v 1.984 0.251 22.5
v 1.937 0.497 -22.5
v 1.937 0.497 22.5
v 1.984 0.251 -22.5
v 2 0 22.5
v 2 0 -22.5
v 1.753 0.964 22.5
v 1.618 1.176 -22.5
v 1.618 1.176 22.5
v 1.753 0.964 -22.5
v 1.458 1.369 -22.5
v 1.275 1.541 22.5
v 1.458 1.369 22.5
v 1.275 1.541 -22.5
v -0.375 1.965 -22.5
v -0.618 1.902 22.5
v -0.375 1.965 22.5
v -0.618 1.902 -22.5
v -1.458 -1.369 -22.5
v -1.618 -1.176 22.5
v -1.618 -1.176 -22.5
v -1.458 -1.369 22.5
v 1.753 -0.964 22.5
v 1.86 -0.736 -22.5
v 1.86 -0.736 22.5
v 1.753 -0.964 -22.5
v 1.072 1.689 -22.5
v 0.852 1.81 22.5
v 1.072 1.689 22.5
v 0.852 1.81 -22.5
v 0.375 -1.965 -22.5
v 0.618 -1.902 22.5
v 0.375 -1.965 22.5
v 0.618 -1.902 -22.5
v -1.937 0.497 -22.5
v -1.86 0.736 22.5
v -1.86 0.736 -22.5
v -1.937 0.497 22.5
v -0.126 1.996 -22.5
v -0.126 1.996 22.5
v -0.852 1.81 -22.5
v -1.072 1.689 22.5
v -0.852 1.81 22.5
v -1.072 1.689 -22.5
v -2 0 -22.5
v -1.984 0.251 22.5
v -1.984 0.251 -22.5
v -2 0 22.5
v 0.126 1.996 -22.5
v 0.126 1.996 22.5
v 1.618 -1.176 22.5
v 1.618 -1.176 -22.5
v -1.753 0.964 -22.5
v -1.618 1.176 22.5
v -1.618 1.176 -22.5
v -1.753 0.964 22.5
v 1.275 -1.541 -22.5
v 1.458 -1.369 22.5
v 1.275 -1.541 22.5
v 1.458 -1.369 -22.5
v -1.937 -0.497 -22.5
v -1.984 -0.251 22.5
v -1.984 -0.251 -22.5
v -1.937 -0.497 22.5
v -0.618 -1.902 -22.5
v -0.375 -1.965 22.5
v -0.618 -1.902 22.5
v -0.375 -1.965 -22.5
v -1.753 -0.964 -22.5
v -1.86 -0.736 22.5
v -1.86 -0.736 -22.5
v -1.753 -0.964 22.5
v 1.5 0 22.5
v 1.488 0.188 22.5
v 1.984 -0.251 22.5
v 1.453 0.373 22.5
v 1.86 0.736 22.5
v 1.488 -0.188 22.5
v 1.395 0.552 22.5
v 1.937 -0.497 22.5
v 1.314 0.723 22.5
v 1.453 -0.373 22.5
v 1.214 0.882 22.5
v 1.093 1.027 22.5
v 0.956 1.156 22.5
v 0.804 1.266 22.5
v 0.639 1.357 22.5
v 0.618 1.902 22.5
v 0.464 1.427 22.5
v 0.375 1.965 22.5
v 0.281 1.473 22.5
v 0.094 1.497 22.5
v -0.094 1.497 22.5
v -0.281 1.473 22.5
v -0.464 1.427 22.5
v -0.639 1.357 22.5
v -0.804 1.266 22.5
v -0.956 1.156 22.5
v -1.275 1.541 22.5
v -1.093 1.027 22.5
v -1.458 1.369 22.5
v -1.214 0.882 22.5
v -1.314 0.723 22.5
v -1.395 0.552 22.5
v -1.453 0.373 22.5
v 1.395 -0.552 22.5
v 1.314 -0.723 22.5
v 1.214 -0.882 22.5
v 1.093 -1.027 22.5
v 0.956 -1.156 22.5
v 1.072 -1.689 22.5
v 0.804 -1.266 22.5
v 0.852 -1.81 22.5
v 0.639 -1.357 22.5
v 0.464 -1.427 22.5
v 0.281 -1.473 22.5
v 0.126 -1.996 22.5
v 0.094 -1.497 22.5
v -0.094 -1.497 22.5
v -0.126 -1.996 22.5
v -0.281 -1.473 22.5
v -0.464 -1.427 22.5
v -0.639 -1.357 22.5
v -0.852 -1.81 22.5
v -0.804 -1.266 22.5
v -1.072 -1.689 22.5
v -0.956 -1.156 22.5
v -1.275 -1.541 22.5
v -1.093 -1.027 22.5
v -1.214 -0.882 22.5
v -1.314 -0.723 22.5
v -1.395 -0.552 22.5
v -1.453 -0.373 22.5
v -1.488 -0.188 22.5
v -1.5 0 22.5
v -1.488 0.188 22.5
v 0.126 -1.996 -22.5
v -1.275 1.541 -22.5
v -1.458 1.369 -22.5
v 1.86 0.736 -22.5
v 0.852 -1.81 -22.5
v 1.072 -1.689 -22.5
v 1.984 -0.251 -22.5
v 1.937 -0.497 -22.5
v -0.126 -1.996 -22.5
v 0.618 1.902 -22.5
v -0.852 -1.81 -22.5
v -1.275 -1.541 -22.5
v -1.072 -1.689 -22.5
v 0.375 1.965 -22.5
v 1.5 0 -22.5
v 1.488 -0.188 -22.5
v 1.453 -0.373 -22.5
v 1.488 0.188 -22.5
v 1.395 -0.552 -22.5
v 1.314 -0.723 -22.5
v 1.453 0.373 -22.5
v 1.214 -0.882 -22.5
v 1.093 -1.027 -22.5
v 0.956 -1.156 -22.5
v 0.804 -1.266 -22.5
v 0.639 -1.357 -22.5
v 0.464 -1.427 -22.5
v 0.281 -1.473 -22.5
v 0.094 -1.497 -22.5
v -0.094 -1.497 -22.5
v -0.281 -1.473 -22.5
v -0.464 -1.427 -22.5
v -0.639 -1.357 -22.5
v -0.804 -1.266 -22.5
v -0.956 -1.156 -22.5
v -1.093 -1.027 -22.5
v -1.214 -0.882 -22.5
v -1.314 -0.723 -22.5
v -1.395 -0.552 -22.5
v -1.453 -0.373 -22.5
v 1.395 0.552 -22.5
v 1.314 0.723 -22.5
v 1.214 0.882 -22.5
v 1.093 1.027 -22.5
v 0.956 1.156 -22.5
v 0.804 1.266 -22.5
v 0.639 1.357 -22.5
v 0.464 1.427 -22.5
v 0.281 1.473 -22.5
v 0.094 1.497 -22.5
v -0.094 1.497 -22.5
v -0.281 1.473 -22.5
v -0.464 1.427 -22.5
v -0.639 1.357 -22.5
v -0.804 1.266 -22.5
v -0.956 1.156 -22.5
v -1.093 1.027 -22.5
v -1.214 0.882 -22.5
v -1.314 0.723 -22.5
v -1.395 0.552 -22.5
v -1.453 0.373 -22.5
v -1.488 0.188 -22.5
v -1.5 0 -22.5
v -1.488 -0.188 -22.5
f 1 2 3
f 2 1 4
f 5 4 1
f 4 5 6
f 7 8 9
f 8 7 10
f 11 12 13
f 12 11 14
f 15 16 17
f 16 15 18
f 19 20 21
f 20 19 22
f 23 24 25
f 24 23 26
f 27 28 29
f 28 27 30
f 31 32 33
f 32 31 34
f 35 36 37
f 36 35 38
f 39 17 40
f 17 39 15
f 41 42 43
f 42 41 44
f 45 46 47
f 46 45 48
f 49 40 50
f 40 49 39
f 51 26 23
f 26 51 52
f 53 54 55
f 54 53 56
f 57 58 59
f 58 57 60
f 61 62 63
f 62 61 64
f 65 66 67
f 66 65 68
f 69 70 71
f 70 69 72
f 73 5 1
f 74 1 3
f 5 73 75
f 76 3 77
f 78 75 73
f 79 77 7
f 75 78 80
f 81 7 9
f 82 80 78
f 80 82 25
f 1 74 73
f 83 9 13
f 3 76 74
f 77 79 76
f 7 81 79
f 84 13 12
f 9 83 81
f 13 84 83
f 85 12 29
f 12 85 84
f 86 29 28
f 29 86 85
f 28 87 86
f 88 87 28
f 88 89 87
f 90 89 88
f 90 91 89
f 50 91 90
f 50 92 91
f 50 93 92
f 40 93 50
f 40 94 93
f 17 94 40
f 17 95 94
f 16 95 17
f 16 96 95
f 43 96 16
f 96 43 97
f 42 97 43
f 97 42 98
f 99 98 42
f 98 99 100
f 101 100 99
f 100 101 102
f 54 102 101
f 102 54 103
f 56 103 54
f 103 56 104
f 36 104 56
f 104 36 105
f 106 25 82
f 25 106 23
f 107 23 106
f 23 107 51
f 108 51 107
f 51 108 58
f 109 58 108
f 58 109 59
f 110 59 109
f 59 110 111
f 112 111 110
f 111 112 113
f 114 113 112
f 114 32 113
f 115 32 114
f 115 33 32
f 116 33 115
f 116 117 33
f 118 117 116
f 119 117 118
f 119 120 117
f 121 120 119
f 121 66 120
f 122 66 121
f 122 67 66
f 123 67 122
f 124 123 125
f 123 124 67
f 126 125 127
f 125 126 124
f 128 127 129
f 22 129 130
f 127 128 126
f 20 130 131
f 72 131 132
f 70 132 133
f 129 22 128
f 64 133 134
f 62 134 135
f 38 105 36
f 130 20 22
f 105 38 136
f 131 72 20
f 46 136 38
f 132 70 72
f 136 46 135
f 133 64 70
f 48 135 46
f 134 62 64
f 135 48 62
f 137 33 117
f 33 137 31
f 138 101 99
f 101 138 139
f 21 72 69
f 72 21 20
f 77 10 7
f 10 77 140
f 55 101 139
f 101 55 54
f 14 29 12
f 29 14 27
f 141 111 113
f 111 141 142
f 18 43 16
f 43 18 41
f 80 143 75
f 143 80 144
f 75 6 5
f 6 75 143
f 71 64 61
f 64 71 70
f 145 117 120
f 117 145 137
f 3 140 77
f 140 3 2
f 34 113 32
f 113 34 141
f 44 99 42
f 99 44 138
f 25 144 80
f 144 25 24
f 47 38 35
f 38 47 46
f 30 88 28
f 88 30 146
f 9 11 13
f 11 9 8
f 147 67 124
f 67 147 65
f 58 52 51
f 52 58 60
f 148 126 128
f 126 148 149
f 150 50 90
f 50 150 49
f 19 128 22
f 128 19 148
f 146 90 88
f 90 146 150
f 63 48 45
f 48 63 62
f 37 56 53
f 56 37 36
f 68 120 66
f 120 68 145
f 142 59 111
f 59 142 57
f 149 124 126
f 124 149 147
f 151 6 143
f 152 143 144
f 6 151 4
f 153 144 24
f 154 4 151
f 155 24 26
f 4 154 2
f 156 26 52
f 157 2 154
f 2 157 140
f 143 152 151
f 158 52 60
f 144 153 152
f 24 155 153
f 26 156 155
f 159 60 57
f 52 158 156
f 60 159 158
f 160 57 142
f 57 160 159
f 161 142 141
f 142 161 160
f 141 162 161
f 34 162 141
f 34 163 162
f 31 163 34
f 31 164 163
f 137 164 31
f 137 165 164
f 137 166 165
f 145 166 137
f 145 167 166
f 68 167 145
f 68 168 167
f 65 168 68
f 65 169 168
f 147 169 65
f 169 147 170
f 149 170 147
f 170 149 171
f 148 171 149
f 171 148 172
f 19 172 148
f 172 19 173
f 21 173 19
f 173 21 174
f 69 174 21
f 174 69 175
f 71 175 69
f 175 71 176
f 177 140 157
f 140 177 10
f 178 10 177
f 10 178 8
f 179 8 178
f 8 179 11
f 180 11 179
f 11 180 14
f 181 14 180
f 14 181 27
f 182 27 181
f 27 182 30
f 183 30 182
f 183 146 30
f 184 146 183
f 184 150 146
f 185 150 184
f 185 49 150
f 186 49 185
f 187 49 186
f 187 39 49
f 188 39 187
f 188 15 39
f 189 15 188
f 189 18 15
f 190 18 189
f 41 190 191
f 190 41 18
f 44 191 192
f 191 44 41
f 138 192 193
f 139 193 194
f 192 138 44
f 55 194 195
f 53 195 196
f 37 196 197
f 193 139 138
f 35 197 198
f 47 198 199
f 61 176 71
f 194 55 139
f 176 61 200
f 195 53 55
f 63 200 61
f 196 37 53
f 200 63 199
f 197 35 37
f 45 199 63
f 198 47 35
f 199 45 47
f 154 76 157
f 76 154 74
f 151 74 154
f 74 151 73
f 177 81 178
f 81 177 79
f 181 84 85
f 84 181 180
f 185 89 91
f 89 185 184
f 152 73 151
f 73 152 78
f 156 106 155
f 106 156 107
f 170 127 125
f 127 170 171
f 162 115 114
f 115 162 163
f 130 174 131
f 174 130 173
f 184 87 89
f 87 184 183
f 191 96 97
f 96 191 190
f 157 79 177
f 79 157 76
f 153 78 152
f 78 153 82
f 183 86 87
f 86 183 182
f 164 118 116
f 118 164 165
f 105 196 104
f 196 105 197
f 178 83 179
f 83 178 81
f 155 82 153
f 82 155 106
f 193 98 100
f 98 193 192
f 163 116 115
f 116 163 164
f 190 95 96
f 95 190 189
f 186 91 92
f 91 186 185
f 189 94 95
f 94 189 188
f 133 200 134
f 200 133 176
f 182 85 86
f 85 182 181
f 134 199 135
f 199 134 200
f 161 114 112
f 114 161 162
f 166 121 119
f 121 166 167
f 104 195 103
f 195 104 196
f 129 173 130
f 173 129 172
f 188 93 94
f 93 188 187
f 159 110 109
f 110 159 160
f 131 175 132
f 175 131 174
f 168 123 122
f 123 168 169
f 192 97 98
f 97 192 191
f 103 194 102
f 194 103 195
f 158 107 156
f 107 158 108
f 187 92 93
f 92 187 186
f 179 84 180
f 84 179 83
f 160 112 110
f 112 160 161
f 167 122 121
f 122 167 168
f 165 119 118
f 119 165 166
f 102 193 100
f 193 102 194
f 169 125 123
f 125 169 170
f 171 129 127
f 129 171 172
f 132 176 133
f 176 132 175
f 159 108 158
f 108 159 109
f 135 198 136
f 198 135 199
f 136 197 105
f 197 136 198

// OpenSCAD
$fn = 50;


difference() {
	union() {
		translate(v = [0, 0, -22.5000000000]) {
			cylinder(h = 45, r = 2.0000000000);
		}
	}
	union() {
		translate(v = [0, 0, -100.0000000000]) {
			cylinder(h = 200, r = 1.5000000000);
		}
	}
}
